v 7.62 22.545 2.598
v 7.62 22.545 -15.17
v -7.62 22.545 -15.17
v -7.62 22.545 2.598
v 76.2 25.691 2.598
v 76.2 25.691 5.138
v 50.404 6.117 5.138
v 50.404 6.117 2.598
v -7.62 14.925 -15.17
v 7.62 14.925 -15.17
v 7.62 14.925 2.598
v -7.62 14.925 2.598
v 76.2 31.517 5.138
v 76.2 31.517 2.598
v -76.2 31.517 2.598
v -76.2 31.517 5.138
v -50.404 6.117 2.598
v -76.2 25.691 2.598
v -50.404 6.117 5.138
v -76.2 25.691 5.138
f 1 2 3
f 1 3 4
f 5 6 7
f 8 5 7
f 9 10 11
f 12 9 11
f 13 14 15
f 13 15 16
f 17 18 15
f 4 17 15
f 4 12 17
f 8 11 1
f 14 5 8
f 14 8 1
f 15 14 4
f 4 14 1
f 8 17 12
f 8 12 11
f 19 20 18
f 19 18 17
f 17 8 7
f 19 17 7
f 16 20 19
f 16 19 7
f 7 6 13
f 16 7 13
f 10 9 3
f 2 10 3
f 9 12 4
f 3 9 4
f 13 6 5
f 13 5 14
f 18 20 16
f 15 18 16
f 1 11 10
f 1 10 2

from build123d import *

# Parameters (mm, degrees)
F0_W     = 7.62
F0_H     = 17.78
F1_DEPTH = 7.62
F2_W     = 25.4
F2_H     = 2.54
F3_DEPTH = 76.2
F5_DEPTH = 50.8


with BuildPart() as f1:
    # F0 (on Right) → F1 (new body)
    with BuildSketch(Plane.YZ):
        with Locations((18.735414, -6.280092)):
            Rectangle(F0_W, F0_H)
    extrude(amount=F1_DEPTH)

    # F2 (on Right) → F3 (join)
    with BuildSketch(Plane.YZ):
        with Locations((18.816974, 3.868257)):
            Rectangle(F2_W, F2_H)
    extrude(amount=F3_DEPTH)

    # F4 (on face) → F5 (cut)
    with BuildSketch(Plane.XY.offset(5.138257)):
        Polygon((76.2, 6.116974), (76.2, 25.691286), (50.403856, 6.116974), align=None)
    extrude(amount=-F5_DEPTH, mode=Mode.SUBTRACT)

    # F6: F1 across plane


with BuildPart() as f1_1:
    add(f1.part)
    add(f1.part.mirror(Plane.YZ))


solid = f1_1.part
